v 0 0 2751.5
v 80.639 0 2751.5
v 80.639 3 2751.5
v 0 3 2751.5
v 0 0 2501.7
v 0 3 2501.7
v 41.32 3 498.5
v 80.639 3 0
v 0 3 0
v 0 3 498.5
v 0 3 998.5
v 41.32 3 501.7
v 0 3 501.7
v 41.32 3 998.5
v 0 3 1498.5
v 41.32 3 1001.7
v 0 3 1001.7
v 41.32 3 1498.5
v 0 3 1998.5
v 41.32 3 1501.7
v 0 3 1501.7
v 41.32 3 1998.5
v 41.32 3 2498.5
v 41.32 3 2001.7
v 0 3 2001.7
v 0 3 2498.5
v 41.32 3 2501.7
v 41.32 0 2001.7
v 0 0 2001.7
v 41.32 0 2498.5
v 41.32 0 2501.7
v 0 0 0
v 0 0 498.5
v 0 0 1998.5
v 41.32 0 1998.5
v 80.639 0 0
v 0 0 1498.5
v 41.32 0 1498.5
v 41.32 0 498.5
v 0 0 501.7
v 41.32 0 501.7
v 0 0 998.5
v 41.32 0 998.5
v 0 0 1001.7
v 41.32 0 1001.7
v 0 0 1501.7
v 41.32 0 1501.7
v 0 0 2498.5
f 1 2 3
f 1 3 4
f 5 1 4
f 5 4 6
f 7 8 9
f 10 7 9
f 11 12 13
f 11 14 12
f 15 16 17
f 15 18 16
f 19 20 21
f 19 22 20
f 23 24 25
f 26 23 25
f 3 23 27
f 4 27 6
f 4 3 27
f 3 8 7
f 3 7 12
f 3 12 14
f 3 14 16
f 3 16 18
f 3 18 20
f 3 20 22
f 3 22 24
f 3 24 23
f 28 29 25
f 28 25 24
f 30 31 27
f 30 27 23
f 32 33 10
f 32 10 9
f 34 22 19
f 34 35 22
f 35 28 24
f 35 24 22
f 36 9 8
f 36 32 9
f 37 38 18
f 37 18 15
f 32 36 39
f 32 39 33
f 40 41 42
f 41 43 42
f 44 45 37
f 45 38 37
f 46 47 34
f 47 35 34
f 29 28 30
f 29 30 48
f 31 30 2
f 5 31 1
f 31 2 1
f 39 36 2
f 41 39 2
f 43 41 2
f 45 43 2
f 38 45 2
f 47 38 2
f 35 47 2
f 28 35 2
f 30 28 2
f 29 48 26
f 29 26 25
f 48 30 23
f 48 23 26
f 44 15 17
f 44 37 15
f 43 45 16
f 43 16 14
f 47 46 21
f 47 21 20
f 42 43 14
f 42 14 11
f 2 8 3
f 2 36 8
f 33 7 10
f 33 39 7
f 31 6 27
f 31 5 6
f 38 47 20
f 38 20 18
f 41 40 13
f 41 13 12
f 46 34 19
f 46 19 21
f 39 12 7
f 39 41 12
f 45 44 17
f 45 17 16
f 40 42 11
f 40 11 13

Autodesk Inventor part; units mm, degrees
ref_plane "YZ Plane" through (0, 0, 0) normal (1, 0, 0) x (0, 1, 0)
ref_plane "XZ Plane" through (0, 0, 0) normal (0, 1, 0) x (-1, 0, 0)
ref_plane "XY Plane" through (0, 0, 0) normal (0, 0, 1) x (1, 0, 0)
sketch "Sketch6" plane through (0, 0, 0) normal (0, 1, 0) x (-1, 0, 0)
  line L0 (0, 0) -> (-80.6394, 0)
  line L1 (-80.6394, 0) -> (-80.6394, 2751.5)
  line L2 (-80.6394, 2751.5) -> (0, 2751.5)
  line L3 (0, 2751.5) -> (0, 0)
  dimension "d26" = 80.6394
  dimension "d27" = 2751.5
extrude "Plate4" add sketch "Sketch6" along normal blind 3
sketch "Sketch7" plane through (0, 0, 0) normal (0, -1, 0) x (1, 0, 0)
  line L0 (0, 2751.5) -> (80.6394, 2751.5) projected
  line L1 (0, 0) -> (0, 2751.5) projected
  line L2 (80.6394, 0) -> (0, 0) projected
  line L3 (80.6394, 2751.5) -> (80.6394, 0) projected
  line L4 (0, 501.7) -> (41.3197, 501.7)
  line L5 (41.3197, 501.7) -> (41.3197, 498.5)
  line L6 (41.3197, 498.5) -> (0, 498.5)
  line L7 (0, 498.5) -> (0, 501.7)
  point P0 (0, 498.5)
  point P1 (0, 200)
  point P2 (46.4173, 200)
  point P3 (0, 498.5)
  dimension "d29" = 41.3197
  dimension "d30" = 3.2
  dimension "d31" = 498.5
extrude "Extrusion2" cut sketch "Sketch7" against normal through all contours L4 L5 L6 L1
pattern_linear "Rectangular Pattern1" count 5 spacing 500 along (0, 0, 1) of "Extrusion2"
equation "\"d26\" = Stringer2_deep"
equation "\"d28\" = Thickness"
equation "\"BendReliefWidth\" = Thickness"
equation "\"BendReliefDepth\" = 0.5 * Thickness"
equation "\"CornerReliefSize\" = 4 * Thickness"
equation "\"MinimumRemnant\" = 2 * Thickness"
equation "\"TransitionRadius\" = BendRadius"
equation "\"JacobiRadiusSize\" = BendRadius"
equation "\"GapSize\" = Thickness"
equation "\"Stringer2_deep\" = 80.639428"
equation "\"Thickness\" = 3"
equation "\"BendRadius\" = 5"
properties part number "BSH 034 stringer board 2" material "09g2s"
